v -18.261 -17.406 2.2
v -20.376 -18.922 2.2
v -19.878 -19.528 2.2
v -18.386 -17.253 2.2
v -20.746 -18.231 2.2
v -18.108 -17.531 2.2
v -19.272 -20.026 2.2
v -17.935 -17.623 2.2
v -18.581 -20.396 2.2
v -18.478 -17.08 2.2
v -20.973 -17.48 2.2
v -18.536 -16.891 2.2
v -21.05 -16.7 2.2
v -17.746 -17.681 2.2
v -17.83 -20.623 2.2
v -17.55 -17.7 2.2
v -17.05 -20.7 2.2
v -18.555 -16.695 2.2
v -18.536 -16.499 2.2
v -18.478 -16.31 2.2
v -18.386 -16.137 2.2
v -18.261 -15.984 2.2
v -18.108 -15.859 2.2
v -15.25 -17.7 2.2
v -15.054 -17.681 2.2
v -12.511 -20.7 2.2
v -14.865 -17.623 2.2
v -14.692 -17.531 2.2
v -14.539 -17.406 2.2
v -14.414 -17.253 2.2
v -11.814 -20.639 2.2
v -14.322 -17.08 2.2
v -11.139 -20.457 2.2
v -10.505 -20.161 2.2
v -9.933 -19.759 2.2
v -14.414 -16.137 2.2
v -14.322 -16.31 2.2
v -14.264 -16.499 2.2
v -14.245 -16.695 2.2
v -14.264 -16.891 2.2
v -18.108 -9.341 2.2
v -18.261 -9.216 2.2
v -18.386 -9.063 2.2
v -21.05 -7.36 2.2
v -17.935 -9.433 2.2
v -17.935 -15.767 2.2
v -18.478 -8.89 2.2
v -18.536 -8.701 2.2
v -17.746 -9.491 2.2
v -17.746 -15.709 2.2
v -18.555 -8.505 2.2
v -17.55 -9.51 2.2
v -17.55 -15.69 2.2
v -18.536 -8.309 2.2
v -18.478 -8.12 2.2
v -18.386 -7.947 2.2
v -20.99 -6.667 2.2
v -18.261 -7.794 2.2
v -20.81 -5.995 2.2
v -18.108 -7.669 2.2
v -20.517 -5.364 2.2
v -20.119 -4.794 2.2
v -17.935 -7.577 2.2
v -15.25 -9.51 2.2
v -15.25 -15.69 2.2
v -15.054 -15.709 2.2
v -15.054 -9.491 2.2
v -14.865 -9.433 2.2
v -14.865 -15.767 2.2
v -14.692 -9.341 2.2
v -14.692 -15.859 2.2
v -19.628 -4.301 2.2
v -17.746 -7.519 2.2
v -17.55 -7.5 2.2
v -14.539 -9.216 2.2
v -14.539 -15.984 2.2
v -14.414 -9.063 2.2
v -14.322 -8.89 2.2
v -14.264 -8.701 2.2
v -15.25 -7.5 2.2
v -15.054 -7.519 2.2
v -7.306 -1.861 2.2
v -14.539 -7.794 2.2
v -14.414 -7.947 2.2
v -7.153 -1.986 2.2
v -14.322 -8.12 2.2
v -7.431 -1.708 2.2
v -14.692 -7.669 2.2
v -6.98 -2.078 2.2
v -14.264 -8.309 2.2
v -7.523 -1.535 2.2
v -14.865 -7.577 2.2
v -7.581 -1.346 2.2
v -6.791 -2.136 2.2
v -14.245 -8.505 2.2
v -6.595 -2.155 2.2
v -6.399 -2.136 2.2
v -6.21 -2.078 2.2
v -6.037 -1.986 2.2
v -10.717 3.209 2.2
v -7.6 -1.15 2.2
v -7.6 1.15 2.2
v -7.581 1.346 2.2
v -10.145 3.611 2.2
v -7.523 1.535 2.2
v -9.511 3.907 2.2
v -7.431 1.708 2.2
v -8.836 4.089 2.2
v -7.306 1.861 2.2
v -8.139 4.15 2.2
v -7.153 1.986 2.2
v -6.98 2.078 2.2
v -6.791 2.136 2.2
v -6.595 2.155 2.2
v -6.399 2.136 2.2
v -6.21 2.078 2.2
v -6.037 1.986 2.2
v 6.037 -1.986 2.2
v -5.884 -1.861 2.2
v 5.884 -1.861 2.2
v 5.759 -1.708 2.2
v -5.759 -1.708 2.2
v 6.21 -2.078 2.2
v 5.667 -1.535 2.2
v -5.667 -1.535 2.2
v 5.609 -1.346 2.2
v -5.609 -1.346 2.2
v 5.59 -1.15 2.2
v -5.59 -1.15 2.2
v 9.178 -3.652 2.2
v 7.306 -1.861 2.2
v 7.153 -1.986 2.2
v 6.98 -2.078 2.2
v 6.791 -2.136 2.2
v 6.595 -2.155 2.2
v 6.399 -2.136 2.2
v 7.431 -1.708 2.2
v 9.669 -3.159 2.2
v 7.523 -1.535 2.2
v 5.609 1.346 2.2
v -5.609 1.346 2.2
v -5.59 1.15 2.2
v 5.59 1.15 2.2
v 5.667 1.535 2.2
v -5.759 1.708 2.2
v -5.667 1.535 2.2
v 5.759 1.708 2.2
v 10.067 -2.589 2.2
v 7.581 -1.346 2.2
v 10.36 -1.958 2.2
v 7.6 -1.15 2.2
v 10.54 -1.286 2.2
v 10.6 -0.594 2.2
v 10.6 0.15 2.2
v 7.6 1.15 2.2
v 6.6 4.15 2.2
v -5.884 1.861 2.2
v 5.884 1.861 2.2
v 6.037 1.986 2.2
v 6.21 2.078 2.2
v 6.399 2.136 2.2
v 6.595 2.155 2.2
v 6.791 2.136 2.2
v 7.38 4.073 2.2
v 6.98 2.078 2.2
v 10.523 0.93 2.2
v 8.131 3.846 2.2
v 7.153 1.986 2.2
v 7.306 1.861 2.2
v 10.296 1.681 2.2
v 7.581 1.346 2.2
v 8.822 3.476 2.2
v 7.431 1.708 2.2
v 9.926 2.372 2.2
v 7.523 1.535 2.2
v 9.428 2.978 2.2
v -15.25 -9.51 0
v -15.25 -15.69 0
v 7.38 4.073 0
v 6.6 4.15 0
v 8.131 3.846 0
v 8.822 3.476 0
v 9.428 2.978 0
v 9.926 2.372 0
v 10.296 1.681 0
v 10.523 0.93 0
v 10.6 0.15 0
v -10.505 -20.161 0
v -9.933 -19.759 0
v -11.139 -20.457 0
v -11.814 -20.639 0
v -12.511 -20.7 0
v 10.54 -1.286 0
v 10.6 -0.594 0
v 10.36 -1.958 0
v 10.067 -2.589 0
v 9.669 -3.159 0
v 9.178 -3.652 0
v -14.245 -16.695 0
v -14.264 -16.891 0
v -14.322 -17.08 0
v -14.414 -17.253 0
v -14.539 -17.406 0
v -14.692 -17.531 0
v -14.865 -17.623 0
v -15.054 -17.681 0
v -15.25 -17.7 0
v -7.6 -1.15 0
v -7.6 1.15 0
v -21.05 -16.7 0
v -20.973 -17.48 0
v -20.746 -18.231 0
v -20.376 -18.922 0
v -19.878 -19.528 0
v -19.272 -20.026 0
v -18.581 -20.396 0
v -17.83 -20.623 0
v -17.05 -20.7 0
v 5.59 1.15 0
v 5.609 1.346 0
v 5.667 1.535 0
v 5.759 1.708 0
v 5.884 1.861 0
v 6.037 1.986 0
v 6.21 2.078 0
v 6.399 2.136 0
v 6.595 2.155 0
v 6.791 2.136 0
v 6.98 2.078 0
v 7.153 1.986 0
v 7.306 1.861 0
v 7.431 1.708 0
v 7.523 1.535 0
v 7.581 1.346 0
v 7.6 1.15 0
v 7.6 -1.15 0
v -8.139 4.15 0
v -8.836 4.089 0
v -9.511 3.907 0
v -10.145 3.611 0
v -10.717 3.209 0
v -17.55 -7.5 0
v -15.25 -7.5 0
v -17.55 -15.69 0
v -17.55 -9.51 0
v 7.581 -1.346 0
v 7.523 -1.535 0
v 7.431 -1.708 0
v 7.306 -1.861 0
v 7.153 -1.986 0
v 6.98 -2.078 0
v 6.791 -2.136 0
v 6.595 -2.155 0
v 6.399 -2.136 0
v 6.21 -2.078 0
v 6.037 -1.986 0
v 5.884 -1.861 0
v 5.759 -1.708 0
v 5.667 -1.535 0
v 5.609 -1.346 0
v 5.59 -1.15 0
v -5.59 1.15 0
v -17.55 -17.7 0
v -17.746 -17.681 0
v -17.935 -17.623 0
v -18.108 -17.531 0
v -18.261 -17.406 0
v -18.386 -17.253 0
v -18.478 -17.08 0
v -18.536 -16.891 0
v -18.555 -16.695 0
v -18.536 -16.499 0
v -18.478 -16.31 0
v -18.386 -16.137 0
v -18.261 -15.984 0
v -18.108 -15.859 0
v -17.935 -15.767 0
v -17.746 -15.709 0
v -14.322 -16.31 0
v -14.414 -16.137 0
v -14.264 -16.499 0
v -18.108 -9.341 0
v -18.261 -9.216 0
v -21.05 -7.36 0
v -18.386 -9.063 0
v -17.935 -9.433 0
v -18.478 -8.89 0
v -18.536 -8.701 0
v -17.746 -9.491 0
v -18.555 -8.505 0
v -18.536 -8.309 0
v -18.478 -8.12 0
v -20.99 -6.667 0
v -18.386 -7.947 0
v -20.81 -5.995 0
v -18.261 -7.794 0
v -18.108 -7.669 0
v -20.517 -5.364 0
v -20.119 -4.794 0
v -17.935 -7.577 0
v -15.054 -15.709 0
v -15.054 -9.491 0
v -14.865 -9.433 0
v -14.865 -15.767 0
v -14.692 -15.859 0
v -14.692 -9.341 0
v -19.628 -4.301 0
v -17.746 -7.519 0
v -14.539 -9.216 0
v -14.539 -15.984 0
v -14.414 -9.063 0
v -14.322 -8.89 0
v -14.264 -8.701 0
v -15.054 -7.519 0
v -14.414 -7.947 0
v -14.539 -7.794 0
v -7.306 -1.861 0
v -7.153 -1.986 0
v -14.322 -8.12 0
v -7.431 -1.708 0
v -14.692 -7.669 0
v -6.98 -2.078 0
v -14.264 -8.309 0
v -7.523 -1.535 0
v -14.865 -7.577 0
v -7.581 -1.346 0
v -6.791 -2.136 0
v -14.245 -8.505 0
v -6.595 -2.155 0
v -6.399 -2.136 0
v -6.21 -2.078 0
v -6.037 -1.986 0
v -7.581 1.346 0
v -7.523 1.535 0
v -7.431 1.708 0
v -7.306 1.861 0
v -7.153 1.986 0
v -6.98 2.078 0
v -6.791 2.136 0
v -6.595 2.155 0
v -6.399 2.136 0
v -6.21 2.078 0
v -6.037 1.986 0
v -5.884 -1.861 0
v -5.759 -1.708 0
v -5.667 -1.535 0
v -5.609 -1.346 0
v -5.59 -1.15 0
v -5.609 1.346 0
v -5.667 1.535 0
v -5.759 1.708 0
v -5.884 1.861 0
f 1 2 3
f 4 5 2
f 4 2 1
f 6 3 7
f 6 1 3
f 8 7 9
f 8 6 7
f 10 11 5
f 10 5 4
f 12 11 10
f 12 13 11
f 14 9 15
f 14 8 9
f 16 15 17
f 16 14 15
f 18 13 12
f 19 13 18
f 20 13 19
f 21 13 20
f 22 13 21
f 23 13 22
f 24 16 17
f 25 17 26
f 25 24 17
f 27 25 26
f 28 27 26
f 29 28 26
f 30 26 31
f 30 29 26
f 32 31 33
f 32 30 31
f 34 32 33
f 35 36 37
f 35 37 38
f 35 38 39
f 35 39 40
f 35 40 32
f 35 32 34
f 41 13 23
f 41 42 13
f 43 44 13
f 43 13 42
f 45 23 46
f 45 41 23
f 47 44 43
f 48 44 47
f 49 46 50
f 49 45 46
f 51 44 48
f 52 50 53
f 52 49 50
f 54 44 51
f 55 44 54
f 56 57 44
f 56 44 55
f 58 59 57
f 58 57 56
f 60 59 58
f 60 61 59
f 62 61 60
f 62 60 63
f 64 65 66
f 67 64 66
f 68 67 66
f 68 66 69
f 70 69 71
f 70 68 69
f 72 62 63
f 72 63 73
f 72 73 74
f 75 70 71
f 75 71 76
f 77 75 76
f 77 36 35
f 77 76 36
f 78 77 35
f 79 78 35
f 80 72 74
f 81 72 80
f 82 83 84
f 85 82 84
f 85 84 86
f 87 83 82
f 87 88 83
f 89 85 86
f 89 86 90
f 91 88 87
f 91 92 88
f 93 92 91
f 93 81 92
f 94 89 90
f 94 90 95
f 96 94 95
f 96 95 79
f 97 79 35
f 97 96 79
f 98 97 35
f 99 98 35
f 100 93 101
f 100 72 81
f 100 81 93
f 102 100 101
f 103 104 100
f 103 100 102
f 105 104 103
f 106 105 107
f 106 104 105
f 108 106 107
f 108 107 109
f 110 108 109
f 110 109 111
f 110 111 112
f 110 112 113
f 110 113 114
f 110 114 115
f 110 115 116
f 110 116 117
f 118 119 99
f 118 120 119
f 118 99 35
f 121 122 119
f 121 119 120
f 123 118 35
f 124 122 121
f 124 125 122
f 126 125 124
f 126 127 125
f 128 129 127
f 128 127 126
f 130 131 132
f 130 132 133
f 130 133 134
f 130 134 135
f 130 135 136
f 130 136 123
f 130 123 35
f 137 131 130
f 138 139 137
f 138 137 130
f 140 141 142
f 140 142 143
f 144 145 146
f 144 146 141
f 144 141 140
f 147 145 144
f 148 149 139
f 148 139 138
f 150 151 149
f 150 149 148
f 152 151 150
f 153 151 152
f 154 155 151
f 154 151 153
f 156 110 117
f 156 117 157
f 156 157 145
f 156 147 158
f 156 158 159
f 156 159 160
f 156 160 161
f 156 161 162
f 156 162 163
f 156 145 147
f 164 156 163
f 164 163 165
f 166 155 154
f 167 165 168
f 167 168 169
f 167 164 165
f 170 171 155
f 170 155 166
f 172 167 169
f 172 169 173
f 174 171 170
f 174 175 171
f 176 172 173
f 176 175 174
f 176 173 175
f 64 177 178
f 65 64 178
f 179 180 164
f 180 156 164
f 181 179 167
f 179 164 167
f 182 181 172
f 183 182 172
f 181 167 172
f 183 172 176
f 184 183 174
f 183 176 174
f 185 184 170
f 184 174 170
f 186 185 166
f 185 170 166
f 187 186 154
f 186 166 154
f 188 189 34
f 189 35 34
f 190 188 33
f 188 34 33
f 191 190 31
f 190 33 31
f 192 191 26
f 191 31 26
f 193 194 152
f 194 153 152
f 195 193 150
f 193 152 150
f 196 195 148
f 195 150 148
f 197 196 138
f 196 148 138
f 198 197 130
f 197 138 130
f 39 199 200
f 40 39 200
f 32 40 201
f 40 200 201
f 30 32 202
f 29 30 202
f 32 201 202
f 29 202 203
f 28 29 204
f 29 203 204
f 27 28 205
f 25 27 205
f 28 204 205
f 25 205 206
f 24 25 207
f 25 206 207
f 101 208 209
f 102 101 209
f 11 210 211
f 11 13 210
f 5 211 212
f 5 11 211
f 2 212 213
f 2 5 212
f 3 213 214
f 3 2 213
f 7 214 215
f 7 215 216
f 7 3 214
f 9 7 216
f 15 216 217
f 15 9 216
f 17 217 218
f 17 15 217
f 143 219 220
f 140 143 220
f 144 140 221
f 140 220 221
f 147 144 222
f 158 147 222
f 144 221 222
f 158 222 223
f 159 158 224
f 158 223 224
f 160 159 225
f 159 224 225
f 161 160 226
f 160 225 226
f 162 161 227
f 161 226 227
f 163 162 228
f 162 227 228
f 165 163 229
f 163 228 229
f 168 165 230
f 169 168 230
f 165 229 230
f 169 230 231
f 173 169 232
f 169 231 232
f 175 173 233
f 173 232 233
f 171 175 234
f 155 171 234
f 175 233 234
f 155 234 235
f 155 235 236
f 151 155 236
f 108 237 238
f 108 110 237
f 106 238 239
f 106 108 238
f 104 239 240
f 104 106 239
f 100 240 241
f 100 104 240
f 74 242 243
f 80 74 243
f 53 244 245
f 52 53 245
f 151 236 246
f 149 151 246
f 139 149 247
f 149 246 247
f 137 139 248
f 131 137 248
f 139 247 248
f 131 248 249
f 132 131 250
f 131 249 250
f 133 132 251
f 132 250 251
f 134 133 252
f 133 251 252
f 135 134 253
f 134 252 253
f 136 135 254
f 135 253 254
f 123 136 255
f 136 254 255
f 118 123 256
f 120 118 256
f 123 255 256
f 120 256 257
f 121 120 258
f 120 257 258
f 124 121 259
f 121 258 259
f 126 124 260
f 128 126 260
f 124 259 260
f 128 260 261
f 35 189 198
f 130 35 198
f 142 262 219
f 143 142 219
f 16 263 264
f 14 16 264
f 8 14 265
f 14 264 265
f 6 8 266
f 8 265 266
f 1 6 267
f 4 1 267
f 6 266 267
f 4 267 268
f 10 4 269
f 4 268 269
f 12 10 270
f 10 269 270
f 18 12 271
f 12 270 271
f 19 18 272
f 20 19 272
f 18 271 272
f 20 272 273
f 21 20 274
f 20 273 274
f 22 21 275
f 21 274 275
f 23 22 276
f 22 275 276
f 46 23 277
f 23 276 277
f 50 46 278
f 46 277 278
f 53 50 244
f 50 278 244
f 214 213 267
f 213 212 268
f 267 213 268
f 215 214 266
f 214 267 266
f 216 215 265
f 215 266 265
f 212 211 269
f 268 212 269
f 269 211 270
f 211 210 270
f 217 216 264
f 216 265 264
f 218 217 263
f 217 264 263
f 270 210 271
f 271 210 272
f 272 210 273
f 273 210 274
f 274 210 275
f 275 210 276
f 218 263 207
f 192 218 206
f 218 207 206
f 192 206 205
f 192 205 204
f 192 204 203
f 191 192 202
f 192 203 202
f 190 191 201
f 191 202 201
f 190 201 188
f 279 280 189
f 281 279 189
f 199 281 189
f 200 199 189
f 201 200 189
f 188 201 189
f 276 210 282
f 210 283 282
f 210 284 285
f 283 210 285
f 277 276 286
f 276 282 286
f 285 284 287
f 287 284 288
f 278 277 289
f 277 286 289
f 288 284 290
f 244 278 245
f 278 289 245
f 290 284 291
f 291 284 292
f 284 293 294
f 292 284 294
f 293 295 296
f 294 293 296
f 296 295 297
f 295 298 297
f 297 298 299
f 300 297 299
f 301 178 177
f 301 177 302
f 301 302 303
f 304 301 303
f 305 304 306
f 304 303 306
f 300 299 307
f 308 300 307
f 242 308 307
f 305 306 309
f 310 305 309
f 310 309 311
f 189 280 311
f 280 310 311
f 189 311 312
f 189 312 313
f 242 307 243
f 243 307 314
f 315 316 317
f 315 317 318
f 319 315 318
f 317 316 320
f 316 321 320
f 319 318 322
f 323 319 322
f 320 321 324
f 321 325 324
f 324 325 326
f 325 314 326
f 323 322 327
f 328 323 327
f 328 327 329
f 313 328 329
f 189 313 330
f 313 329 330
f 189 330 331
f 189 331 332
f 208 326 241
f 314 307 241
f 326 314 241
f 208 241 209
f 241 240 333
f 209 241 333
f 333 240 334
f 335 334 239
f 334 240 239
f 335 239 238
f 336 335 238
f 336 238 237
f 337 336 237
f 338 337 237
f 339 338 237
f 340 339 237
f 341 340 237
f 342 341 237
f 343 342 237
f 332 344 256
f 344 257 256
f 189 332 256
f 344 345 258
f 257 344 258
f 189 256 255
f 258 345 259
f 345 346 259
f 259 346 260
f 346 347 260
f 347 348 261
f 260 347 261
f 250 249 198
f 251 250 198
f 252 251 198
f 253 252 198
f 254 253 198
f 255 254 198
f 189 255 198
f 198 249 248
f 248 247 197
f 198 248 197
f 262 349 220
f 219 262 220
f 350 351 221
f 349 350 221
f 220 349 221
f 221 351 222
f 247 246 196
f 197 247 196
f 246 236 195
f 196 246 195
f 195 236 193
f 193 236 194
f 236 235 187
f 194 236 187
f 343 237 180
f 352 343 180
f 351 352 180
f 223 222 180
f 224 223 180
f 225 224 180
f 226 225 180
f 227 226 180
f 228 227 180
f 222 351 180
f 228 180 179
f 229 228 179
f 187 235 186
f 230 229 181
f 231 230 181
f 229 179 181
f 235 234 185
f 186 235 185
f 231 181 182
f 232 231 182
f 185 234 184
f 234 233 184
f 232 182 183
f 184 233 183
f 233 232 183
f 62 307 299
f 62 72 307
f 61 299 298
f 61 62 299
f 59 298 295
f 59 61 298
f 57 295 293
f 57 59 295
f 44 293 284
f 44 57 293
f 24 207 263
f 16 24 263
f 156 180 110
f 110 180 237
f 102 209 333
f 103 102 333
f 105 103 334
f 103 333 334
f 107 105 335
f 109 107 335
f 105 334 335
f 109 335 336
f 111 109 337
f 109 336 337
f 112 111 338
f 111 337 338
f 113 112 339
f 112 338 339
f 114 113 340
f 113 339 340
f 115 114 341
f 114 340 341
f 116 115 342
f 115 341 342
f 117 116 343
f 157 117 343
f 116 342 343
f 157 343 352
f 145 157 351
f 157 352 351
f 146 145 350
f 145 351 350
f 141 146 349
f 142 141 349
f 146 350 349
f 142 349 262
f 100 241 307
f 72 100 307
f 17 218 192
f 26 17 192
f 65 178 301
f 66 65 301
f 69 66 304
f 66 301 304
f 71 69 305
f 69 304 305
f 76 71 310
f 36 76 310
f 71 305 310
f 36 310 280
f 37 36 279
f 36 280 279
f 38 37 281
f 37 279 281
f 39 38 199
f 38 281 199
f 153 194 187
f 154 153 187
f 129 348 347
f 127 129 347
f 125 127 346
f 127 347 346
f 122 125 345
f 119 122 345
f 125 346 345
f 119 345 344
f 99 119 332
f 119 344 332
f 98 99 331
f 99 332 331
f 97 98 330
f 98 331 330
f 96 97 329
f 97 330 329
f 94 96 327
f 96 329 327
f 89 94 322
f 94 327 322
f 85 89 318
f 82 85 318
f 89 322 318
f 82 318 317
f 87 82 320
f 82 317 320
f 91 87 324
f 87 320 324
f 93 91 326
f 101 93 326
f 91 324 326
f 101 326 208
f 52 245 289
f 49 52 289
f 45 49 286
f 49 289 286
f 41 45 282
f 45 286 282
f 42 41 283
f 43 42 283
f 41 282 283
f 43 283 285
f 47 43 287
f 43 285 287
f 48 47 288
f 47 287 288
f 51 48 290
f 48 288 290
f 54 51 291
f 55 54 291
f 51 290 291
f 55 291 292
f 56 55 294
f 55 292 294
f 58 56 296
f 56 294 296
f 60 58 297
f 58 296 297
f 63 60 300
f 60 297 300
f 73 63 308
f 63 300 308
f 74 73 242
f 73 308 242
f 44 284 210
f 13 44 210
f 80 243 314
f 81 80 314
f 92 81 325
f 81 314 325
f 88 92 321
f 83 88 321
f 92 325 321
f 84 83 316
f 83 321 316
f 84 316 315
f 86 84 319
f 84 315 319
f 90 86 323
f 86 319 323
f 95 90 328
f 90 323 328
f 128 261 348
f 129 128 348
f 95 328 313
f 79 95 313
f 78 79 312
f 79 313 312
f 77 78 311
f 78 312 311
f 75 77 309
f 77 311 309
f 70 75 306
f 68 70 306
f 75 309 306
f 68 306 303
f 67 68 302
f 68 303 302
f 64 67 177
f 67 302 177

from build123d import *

# Parameters (mm, degrees)
EXTRUDE_1_DEPTH = 2.2
FILLET_1_R      = 4


with BuildPart() as part:
    # 草图1 → 凸台-拉伸1 (new body)
    with BuildSketch(Plane.XY):
        Polygon((10.6, 4.15), (-9.6, 4.15), (-21.05, -5.5), (-21.05, -20.7), (-11.05, -20.7), (10.6, -2.45349345), align=None)
        with BuildLine():
            ThreePointArc((-14.245, -16.695), (-14.539357685, -17.405642315), (-15.25, -17.7))
            Line((-15.25, -17.7), (-17.55, -17.7))
            ThreePointArc((-17.55, -17.7), (-18.555, -16.695), (-17.55, -15.69))
            Line((-17.55, -15.69), (-17.55, -9.51))
            ThreePointArc((-17.55, -9.51), (-18.555, -8.505), (-17.55, -7.5))
            Line((-17.55, -7.5), (-15.25, -7.5))
            ThreePointArc((-15.25, -7.5), (-14.539357685, -7.794357685), (-14.245, -8.505))
            ThreePointArc((-14.245, -8.505), (-14.539357685, -9.215642315), (-15.25, -9.51))
            Line((-15.25, -9.51), (-15.25, -15.69))
            ThreePointArc((-15.25, -15.69), (-14.539357685, -15.984357685), (-14.245, -16.695))
        make_face(mode=Mode.SUBTRACT)
        with BuildLine():
            Line((5.59, -1.15), (-5.59, -1.15))
            ThreePointArc((-5.59, -1.15), (-6.595, -2.155), (-7.6, -1.15))
            Line((-7.6, -1.15), (-7.6, 1.15))
            ThreePointArc((-7.6, 1.15), (-6.595, 2.155), (-5.59, 1.15))
            Line((-5.59, 1.15), (5.59, 1.15))
            ThreePointArc((5.59, 1.15), (6.595, 2.155), (7.6, 1.15))
            Line((7.6, 1.15), (7.6, -1.15))
            ThreePointArc((7.6, -1.15), (6.595, -2.155), (5.59, -1.15))
        make_face(mode=Mode.SUBTRACT)
    extrude(amount=EXTRUDE_1_DEPTH)

    # 圆角1
    fillet_1_edges = [part.edges().sort_by_distance(p)[0] for p in [
        (-9.6, 4.15, 1.1),
        (10.6, 4.15, 1.1),
        (10.6, -2.45349345, 1.1),
        (-11.05, -20.7, 1.1),
        (-21.05, -20.7, 1.1),
        (-21.05, -5.5, 1.1),
    ]]
    fillet(fillet_1_edges, radius=FILLET_1_R)


solid = part.part
